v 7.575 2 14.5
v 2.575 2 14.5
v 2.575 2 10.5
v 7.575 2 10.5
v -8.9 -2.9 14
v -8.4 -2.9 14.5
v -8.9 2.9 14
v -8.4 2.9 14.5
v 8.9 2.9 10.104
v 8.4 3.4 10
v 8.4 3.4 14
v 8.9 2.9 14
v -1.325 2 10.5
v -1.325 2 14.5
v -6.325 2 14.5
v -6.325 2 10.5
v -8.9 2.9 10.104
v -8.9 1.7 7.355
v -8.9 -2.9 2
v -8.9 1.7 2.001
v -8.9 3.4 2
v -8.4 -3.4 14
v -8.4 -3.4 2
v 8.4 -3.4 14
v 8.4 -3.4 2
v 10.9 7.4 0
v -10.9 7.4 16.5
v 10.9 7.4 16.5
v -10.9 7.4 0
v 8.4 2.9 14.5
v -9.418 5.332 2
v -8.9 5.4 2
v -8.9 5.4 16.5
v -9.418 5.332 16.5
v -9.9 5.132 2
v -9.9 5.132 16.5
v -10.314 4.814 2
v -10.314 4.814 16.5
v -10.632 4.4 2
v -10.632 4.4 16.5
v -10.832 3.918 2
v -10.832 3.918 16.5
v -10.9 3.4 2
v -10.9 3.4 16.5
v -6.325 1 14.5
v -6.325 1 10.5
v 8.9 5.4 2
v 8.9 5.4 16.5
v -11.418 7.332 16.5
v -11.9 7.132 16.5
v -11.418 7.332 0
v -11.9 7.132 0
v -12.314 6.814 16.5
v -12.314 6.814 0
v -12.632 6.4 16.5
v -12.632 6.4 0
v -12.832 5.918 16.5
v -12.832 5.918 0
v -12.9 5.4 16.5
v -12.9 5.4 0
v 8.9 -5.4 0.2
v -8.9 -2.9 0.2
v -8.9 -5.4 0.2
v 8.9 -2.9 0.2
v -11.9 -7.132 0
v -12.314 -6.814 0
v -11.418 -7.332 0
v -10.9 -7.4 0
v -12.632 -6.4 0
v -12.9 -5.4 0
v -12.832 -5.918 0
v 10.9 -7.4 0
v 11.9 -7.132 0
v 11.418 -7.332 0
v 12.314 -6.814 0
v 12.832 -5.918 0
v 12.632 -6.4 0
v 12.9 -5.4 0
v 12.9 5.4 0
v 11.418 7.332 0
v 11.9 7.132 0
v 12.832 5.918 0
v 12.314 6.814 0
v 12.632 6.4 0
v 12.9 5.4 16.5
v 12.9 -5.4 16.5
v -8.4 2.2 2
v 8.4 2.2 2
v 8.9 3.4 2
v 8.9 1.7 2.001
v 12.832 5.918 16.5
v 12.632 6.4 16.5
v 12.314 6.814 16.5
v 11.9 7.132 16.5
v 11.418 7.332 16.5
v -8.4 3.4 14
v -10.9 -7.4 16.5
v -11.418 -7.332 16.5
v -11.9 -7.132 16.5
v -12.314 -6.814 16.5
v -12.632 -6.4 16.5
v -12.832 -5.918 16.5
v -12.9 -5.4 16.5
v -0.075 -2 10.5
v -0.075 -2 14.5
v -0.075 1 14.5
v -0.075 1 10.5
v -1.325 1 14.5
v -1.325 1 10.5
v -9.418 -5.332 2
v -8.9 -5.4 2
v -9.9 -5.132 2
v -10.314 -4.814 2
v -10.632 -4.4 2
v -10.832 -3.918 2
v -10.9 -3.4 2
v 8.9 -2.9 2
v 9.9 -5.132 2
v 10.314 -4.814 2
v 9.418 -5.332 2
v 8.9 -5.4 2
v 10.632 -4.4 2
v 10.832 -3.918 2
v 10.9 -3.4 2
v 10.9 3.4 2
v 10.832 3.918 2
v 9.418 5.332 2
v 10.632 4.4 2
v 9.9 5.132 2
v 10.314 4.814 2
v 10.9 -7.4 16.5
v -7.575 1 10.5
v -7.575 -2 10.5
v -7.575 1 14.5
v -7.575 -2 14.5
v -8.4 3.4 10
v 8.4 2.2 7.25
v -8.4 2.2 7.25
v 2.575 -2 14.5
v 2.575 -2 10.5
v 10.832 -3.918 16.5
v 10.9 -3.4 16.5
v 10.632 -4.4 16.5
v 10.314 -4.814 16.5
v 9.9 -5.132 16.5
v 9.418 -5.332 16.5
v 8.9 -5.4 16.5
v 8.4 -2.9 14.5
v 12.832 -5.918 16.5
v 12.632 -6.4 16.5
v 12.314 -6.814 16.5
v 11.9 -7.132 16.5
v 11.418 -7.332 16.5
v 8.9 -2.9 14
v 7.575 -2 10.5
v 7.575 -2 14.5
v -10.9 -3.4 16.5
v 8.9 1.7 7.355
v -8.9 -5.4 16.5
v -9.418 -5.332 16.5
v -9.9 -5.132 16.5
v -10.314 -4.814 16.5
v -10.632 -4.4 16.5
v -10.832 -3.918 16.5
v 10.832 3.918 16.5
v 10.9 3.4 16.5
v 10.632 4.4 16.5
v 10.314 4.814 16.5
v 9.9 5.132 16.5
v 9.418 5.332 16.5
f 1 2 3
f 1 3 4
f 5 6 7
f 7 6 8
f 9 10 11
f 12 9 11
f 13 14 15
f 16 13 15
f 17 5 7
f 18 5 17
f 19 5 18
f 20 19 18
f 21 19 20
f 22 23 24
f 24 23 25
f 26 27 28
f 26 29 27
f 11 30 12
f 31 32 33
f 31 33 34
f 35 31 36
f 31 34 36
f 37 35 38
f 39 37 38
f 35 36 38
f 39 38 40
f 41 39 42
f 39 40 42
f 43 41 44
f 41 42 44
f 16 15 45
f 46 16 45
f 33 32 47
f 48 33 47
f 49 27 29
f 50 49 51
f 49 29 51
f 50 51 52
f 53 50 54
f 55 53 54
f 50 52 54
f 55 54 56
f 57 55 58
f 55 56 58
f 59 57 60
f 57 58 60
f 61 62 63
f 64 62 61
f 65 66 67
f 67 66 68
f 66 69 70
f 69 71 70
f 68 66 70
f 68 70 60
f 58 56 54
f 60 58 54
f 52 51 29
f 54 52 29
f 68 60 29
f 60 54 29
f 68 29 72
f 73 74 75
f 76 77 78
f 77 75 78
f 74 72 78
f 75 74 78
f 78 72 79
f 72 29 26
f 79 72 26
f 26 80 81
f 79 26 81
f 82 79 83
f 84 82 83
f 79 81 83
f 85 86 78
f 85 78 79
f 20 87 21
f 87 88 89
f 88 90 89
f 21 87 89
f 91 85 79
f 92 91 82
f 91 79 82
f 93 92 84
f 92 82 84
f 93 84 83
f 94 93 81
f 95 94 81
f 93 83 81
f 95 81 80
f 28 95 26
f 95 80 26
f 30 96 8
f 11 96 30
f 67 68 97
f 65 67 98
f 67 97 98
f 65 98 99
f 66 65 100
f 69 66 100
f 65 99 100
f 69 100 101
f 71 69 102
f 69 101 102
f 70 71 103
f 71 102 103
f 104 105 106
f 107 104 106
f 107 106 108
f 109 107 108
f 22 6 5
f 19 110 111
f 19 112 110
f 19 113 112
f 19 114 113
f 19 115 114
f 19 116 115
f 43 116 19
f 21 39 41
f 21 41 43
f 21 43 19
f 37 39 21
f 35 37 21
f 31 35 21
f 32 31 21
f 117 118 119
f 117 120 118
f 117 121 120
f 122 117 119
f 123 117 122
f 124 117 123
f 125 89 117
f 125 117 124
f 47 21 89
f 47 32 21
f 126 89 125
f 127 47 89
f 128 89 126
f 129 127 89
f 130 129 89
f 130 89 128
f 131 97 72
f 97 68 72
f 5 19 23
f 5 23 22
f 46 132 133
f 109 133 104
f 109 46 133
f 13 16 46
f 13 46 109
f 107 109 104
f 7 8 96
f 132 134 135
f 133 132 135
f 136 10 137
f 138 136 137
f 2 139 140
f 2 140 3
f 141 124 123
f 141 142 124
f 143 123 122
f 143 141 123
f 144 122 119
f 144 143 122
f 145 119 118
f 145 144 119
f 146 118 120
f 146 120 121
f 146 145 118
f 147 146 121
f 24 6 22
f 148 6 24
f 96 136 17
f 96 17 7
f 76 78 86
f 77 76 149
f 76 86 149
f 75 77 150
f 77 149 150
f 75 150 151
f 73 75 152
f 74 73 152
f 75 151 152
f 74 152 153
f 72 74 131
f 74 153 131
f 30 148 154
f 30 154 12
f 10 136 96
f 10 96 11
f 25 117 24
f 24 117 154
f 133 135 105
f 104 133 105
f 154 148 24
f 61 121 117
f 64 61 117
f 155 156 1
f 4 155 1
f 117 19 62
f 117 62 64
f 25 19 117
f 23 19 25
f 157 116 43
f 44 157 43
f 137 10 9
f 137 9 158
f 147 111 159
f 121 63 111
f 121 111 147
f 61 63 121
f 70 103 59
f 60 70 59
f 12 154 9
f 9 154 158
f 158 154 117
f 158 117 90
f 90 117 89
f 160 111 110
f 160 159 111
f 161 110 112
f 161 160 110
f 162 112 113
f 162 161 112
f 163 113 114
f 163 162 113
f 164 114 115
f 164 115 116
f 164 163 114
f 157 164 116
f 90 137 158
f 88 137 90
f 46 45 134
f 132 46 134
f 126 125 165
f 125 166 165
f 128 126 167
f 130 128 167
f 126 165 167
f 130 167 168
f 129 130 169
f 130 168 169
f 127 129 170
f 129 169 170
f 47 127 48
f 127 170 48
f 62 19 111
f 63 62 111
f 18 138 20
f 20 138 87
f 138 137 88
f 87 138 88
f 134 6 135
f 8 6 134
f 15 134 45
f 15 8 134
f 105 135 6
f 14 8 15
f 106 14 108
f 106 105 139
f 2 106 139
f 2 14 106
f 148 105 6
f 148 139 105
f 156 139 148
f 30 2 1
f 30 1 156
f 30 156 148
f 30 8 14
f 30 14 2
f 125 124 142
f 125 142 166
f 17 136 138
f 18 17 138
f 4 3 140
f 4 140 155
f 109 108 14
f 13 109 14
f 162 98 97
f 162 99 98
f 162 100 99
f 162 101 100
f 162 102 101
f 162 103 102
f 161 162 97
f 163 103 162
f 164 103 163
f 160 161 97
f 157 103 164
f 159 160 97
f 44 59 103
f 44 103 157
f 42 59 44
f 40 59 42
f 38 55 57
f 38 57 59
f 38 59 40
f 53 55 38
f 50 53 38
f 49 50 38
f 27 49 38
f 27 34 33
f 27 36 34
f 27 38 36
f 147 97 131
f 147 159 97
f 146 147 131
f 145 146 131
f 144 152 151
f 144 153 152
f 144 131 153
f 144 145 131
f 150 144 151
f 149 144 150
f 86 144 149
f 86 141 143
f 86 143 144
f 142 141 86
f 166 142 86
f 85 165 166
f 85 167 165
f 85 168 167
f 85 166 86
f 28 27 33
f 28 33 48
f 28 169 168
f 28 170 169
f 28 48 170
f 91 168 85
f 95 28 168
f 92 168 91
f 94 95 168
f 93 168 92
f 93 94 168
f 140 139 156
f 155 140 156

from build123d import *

# Parameters (mm, degrees)
F0_W      = 25.8
F0_H      = 14.8
F1_DEPTH  = 2
F2_W      = 25.8
F2_H      = 14.8
F2_W_2    = 21.8
F2_H_2    = 10.8
F3_DEPTH  = 14.5
F4_W      = 17.8
F4_H      = 6.8
F5_DEPTH  = 12.5
F7_DEPTH  = 17.8
F8_SIZE   = 0.5
F9_R      = 2
F10_W     = 5
F10_H     = 4
F11_DEPTH = 6
F12_W     = 17.8
F12_H     = 0.5
F12_H_2   = 2
F13_DEPTH = 1.8


with BuildPart() as f1:
    # F0 (on Top) → F1 (new body)
    with BuildSketch(Plane.XY):
        Rectangle(F0_W, F0_H)
    extrude(amount=F1_DEPTH)

    # F2 (on face) → F3 (join)
    with BuildSketch(Plane.XY.offset(2)):
        Rectangle(F2_W, F2_H)
        Rectangle(F2_W_2, F2_H_2, mode=Mode.SUBTRACT)
    extrude(amount=F3_DEPTH)

    # F4 (on face) → F5 (join)
    with BuildSketch(Plane.XY.offset(2)):
        Rectangle(F4_W, F4_H)
    extrude(amount=F5_DEPTH)

    # F6 (on face) → F7 (cut)
    with BuildSketch(Plane.YZ.offset(8.9)):
        Polygon((2.2, 2.000455), (3.4, 2), (3.4, 10), (2.2, 7.250455), align=None)
    extrude(amount=-F7_DEPTH, mode=Mode.SUBTRACT)

    # F8
    f8_edges = [f1.edges().sort_by_distance(p)[0] for p in [
        (0, 3.4, 14.5),
        (-8.9, 0, 14.5),
        (0, -3.4, 14.5),
        (8.9, 0, 14.5),
        (-8.9, -3.4, 8.25),
        (8.9, -3.4, 8.25),
        (8.9, 3.4, 12.25),
        (-8.9, 3.4, 12.25),
        (-8.9, 2.2, 4.625455),
        (-8.9, 2.8, 8.625227),
        (8.9, 2.2, 4.625455),
        (8.9, 2.8, 8.625227),
    ]]
    chamfer(f8_edges, length=F8_SIZE)

    # F9
    f9_edges = [f1.edges().sort_by_distance(p)[0] for p in [
        (-12.9, 7.4, 8.25),
        (12.9, 7.4, 8.25),
        (10.9, 5.4, 9.25),
        (-10.9, 5.4, 9.25),
        (10.9, -5.4, 9.25),
        (-10.9, -5.4, 9.25),
        (-12.9, -7.4, 8.25),
        (12.9, -7.4, 8.25),
    ]]
    fillet(f9_edges, radius=F9_R)

    # F10 (on face) → F11 (cut)
    with BuildSketch(Plane.XY.offset(16.5)):
        Polygon((-7.575, 1), (-7.575, -2), (-0.075, -2), (-0.075, 1), (-1.325, 1), (-1.325, 2), (-6.325, 2), (-6.325, 1), align=None)
        with Locations((5.075, 0)):
            Rectangle(F10_W, F10_H)
    extrude(amount=-F11_DEPTH, mode=Mode.SUBTRACT)

    # F12 (on face) → F13 (cut)
    with BuildSketch(Plane.XY.offset(2)):
        with Locations((0, -3.15)):
            Rectangle(F12_W, F12_H)
        with Locations((0, -4.4)):
            Rectangle(F12_W, F12_H_2)
    extrude(amount=-F13_DEPTH, mode=Mode.SUBTRACT)


solid = f1.part
